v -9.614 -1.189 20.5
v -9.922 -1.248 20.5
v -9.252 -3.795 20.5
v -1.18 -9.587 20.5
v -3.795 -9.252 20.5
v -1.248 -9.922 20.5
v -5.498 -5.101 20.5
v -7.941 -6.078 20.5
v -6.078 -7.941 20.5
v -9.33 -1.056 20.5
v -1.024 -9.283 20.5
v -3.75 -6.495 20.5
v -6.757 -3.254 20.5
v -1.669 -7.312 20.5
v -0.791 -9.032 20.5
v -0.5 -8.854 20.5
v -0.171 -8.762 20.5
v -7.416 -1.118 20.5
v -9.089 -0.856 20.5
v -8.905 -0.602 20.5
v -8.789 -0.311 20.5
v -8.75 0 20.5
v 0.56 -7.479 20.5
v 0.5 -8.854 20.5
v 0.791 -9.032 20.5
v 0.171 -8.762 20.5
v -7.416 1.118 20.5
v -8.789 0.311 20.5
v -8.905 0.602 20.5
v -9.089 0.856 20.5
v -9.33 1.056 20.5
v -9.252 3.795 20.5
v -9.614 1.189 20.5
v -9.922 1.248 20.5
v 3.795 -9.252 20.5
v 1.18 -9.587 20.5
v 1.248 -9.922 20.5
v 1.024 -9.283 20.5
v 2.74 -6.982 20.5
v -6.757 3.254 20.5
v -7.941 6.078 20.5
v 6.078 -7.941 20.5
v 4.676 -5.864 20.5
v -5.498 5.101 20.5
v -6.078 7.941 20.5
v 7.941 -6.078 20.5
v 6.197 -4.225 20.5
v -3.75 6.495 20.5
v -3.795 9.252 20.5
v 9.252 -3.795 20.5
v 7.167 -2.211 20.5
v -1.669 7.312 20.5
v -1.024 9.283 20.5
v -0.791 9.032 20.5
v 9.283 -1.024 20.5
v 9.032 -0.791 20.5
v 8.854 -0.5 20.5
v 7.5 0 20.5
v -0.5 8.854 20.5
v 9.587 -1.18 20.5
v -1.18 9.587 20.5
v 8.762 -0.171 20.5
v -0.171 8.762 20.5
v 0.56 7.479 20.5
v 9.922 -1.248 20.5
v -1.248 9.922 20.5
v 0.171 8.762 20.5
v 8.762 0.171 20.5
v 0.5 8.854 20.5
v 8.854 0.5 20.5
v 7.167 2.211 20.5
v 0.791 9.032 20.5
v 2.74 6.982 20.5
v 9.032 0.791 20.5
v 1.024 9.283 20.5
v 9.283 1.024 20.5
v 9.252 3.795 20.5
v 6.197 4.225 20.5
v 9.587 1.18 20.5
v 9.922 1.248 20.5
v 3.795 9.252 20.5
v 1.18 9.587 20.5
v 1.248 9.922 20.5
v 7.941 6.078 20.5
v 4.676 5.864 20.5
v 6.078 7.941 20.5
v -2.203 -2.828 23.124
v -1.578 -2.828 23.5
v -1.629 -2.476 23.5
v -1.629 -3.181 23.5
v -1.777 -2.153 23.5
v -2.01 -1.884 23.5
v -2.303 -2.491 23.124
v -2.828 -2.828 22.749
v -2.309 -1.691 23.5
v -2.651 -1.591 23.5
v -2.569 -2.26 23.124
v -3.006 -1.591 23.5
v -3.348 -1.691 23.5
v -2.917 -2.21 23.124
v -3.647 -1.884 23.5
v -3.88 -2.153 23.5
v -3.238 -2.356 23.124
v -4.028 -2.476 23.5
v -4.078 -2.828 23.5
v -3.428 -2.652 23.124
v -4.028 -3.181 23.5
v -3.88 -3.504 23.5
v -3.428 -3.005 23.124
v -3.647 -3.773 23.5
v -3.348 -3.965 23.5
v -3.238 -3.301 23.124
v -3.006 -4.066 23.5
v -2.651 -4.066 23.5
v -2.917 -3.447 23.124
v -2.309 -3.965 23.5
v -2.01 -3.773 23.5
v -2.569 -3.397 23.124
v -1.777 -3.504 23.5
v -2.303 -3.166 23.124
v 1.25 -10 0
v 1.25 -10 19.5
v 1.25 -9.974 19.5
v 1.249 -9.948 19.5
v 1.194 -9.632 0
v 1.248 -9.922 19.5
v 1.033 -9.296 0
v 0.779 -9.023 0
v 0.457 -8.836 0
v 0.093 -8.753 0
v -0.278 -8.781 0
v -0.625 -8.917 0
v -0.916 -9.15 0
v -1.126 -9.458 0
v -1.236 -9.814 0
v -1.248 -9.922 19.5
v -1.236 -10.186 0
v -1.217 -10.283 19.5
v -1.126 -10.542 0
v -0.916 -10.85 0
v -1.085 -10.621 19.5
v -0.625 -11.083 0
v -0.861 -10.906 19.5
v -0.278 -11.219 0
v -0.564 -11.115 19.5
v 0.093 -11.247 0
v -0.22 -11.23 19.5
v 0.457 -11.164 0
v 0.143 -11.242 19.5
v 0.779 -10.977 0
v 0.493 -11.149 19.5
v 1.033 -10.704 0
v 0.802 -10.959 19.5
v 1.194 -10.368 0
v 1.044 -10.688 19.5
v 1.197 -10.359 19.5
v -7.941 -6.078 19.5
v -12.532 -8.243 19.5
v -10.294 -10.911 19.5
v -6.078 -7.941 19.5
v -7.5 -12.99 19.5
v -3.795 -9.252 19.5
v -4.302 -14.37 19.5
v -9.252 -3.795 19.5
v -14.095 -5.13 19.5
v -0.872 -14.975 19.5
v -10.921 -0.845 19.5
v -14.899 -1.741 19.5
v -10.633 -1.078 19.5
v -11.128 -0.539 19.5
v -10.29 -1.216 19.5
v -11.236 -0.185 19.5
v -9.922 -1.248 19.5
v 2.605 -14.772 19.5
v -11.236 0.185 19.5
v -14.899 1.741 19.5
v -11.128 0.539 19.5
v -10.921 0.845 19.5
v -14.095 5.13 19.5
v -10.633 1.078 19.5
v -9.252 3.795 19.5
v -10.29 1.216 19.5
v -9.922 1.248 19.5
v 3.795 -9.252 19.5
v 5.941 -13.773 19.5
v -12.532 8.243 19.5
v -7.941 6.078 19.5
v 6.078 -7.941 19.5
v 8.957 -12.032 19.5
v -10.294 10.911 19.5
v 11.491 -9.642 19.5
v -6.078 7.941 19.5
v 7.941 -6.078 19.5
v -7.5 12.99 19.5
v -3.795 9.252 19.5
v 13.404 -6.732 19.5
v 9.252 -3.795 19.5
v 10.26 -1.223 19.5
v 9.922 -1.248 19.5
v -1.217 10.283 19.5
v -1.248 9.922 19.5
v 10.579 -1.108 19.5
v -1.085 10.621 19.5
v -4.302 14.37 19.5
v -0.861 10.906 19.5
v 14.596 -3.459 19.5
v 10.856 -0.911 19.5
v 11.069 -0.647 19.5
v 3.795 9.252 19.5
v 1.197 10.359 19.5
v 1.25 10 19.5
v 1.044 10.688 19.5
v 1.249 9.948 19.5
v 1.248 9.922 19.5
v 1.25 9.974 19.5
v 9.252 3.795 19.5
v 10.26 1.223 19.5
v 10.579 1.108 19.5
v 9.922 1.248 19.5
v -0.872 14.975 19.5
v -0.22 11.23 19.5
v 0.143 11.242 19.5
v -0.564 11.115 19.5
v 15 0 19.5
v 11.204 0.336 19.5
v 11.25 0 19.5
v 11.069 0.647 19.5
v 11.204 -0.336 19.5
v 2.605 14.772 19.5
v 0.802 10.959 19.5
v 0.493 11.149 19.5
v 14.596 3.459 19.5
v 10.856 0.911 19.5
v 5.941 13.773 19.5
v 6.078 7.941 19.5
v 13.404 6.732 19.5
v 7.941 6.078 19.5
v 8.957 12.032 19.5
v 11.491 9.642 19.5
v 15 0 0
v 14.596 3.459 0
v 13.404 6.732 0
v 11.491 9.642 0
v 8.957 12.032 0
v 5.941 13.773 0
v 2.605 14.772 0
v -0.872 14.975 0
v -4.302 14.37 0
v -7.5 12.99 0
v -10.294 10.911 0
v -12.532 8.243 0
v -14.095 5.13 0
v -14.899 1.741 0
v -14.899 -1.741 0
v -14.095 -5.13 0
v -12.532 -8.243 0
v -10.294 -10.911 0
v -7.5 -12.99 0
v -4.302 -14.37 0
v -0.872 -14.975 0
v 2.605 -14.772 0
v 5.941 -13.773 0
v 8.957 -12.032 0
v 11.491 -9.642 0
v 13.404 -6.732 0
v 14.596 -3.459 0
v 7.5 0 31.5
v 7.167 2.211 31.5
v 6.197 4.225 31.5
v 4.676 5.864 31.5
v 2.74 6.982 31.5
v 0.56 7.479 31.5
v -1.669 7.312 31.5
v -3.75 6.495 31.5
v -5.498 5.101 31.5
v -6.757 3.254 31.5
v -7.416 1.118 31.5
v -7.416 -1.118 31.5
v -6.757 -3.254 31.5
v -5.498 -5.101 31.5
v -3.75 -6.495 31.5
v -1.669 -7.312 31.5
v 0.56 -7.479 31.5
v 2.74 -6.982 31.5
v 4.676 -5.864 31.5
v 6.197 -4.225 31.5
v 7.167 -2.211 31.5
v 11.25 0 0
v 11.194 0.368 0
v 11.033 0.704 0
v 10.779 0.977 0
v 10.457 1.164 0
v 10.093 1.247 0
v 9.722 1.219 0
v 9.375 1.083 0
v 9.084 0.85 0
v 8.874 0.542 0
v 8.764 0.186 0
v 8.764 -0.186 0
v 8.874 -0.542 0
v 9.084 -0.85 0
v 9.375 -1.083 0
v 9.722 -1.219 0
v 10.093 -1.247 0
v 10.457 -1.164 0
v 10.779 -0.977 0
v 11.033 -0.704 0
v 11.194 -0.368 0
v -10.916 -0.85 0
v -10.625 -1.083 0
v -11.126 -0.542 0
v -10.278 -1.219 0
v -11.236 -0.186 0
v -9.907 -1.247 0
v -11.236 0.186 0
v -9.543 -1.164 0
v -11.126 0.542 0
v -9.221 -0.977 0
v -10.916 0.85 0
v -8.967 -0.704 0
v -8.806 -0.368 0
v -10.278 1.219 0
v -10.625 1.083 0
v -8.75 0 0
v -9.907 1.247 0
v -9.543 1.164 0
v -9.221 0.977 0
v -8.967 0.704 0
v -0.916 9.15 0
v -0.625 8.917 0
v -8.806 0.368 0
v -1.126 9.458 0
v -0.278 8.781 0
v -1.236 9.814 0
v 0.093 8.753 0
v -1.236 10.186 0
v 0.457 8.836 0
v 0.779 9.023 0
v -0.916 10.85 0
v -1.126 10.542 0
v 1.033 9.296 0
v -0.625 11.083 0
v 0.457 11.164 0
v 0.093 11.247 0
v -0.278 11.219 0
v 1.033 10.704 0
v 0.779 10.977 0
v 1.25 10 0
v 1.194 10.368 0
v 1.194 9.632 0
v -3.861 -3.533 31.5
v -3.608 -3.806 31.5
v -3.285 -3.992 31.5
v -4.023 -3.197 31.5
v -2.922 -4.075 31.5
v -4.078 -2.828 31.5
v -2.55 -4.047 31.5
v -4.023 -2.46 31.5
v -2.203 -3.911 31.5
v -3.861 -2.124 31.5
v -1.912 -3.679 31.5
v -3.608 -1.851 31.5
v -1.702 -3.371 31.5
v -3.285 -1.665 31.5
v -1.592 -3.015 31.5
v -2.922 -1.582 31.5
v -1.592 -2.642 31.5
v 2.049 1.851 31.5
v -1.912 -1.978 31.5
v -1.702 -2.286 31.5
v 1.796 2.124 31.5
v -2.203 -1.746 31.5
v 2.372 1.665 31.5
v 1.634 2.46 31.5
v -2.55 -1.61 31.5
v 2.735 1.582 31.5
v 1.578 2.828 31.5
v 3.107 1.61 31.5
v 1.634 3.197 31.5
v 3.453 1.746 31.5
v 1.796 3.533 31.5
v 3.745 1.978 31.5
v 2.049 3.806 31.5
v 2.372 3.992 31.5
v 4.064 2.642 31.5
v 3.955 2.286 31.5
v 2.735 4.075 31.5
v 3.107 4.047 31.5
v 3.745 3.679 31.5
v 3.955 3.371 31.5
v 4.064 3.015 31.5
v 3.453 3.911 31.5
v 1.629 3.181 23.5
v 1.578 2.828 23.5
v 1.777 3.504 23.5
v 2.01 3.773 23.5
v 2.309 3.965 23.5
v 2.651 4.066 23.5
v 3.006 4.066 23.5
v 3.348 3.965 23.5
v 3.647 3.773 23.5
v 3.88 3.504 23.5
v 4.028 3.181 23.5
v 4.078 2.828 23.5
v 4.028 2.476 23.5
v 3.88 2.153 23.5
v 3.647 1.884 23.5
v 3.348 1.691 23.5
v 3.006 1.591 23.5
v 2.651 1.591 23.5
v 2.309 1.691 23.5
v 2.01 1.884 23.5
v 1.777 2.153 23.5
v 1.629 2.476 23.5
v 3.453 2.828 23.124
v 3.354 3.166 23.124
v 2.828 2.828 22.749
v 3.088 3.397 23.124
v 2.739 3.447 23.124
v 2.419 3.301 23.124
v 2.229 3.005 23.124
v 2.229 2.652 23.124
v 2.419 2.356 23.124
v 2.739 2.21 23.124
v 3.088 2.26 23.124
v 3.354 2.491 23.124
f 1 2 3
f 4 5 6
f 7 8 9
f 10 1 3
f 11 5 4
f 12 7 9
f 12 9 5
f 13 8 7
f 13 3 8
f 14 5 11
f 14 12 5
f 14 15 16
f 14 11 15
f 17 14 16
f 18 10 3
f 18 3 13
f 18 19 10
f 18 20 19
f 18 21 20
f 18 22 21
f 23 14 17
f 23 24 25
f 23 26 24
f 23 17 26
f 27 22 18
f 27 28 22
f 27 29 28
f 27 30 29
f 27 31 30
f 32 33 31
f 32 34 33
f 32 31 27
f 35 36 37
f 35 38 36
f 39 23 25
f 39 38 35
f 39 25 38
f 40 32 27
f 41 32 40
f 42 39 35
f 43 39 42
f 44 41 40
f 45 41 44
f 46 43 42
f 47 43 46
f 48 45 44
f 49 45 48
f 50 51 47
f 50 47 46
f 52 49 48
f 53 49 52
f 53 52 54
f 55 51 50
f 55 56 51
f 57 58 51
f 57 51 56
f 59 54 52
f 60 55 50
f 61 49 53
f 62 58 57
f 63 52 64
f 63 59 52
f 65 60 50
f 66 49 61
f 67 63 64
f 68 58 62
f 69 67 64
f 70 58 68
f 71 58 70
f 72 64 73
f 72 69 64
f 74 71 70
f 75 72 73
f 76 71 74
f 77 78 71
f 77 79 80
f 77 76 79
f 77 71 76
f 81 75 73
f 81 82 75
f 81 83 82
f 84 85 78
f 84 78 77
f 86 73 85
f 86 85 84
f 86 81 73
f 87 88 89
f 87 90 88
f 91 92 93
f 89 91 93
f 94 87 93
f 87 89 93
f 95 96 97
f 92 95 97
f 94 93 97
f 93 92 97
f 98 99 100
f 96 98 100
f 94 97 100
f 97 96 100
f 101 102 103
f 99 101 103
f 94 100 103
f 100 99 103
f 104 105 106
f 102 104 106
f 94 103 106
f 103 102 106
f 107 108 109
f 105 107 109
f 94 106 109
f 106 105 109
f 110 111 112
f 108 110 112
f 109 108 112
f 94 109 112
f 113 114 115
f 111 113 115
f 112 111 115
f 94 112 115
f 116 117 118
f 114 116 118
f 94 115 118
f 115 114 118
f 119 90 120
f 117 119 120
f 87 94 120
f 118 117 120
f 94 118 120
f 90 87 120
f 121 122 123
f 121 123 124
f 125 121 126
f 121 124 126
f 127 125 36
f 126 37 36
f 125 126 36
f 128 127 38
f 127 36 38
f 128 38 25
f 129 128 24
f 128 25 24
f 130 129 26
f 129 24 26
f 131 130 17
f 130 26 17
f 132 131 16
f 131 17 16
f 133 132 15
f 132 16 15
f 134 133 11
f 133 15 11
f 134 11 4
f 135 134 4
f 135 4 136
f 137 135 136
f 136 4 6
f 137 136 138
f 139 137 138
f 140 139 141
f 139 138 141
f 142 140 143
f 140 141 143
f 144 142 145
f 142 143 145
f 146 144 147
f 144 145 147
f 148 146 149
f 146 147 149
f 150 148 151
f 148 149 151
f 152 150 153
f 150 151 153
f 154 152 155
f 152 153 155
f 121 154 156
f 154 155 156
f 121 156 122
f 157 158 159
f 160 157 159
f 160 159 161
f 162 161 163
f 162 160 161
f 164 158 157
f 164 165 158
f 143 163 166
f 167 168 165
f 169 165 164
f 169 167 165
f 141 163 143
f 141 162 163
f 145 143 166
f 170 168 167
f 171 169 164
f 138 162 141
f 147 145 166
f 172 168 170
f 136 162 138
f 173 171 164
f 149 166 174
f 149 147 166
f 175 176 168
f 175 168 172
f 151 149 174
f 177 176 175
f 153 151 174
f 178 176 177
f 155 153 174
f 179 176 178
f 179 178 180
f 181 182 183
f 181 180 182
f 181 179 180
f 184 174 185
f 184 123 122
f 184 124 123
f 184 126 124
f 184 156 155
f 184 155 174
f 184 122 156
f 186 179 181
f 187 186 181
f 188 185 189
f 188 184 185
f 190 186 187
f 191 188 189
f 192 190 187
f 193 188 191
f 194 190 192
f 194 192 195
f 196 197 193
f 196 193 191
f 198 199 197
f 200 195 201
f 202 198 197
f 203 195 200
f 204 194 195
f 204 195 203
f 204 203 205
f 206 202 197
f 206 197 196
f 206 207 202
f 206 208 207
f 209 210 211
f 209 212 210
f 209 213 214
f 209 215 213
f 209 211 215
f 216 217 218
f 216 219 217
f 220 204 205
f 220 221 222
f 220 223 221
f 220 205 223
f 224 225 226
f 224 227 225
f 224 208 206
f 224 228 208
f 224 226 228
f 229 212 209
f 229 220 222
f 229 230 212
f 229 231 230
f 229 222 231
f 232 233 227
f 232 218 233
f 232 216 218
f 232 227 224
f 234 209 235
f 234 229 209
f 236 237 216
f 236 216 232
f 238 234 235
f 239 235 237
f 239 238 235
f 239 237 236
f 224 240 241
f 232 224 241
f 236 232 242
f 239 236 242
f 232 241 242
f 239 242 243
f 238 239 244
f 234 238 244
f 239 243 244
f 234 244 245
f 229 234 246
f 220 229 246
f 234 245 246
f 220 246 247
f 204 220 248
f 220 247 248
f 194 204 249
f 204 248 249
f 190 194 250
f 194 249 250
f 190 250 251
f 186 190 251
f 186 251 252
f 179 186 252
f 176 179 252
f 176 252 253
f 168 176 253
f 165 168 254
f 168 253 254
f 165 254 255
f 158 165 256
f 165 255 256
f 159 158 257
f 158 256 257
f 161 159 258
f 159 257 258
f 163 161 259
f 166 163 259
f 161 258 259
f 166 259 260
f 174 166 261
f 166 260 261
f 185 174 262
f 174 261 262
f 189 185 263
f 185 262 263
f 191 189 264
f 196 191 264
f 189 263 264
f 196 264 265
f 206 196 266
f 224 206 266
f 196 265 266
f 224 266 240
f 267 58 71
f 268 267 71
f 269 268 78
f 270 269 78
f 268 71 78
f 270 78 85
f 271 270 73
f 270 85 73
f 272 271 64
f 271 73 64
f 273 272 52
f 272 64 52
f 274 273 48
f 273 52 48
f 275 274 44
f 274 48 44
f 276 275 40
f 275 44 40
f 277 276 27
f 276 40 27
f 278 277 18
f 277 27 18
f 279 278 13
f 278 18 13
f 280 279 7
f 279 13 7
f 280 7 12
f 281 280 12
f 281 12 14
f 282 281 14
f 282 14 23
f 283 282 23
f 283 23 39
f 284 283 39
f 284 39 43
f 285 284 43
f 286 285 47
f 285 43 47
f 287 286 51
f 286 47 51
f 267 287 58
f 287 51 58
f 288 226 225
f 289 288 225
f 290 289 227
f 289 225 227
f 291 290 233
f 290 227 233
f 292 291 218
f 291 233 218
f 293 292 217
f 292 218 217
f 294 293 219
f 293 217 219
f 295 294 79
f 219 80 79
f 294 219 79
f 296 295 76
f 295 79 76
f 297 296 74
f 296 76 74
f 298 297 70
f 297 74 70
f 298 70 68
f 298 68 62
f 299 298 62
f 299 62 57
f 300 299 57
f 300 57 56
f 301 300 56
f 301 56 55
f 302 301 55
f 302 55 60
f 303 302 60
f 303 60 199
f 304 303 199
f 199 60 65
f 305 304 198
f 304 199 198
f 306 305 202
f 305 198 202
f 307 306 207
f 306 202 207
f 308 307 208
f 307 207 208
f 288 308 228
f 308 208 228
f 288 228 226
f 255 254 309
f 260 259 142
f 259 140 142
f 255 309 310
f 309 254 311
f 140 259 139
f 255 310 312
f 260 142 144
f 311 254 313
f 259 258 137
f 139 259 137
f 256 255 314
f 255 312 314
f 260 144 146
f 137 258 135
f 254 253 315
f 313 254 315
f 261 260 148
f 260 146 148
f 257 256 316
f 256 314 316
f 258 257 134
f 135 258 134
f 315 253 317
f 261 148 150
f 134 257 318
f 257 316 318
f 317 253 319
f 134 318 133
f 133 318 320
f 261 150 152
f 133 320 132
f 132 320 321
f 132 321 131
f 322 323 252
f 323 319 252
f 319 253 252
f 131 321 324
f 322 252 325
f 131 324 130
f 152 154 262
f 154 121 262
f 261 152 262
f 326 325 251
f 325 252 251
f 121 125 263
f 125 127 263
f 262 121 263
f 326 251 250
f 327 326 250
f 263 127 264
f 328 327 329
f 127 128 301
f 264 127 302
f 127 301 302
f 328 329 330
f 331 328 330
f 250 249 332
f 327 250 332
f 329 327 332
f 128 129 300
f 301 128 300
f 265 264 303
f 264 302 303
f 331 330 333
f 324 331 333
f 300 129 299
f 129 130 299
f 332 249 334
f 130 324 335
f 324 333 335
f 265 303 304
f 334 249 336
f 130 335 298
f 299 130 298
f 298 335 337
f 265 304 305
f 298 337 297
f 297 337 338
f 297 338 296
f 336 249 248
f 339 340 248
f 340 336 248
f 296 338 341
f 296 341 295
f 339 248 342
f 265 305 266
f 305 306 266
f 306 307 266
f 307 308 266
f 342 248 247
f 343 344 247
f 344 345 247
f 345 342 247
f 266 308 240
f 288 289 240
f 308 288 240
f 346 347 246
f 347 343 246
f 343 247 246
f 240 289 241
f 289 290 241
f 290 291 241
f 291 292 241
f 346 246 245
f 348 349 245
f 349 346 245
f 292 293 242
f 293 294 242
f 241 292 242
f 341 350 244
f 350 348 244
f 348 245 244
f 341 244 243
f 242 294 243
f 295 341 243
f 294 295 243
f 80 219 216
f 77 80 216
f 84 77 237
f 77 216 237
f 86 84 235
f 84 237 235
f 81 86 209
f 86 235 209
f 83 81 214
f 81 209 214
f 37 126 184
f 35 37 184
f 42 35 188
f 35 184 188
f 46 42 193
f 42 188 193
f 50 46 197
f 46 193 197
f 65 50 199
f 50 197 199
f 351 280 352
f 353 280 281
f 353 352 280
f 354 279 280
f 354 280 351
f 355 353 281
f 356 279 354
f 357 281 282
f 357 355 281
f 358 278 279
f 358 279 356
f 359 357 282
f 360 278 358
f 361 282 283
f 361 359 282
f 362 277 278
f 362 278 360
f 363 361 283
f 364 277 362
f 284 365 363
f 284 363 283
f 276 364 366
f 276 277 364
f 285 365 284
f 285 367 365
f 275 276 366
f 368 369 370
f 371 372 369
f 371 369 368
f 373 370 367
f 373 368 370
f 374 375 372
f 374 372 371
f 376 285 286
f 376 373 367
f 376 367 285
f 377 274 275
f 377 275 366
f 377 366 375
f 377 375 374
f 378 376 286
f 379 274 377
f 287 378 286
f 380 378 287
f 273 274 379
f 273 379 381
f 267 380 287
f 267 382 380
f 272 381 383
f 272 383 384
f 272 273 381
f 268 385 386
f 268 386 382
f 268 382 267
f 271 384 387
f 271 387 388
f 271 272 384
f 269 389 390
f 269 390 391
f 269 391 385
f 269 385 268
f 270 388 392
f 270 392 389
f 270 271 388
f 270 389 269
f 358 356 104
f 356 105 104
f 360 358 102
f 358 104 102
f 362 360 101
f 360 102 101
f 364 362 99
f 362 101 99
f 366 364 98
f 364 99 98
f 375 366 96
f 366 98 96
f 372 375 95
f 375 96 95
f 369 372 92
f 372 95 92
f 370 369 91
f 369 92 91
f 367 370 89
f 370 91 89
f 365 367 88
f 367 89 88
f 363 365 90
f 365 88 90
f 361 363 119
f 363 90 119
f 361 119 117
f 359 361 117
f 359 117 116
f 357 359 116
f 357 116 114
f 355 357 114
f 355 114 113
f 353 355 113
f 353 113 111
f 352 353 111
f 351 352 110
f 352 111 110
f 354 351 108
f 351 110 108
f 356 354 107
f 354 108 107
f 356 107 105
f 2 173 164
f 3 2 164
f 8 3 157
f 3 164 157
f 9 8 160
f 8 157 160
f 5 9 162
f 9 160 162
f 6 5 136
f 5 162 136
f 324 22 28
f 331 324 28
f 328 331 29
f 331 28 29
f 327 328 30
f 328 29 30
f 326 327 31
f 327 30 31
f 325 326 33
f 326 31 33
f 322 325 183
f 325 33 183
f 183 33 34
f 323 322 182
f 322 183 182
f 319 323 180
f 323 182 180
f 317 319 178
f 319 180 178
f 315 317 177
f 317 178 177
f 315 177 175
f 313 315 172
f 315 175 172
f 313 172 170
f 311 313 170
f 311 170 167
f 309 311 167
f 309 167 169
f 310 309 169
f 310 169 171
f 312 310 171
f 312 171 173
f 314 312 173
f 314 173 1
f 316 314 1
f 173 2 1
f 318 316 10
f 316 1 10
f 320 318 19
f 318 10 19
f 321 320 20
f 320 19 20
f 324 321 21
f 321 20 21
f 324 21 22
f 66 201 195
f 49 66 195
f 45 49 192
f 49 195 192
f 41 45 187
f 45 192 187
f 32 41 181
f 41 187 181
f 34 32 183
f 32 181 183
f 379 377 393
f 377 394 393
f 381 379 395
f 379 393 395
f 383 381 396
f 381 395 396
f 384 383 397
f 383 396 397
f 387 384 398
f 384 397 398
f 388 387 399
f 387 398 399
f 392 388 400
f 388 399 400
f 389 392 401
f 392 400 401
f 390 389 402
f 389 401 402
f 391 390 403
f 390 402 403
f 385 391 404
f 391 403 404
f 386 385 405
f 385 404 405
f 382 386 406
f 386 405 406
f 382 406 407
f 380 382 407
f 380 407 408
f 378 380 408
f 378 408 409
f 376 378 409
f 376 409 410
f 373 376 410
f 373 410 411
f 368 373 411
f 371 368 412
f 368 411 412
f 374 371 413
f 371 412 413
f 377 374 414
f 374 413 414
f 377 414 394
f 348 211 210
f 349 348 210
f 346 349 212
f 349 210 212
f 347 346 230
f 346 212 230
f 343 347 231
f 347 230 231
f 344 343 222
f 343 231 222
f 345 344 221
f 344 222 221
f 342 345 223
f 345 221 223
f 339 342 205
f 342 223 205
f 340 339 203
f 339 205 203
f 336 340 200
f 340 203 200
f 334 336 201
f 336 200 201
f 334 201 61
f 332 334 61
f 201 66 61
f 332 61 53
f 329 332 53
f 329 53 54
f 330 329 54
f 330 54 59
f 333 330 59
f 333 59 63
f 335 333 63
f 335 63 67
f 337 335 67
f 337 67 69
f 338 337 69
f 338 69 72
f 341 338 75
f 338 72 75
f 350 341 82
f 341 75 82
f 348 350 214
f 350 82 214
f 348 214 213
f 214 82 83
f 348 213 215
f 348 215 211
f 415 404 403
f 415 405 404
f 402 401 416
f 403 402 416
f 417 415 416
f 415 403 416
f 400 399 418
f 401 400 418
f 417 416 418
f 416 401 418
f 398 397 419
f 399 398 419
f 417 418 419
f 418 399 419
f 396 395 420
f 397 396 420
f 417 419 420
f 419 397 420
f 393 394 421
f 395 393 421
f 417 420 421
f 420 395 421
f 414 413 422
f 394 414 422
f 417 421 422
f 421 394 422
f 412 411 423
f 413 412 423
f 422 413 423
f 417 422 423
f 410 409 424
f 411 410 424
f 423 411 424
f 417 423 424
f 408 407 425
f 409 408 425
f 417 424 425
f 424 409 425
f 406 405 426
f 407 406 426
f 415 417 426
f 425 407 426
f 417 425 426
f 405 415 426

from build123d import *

# Parameters (mm, degrees)
SKETCH_1_R      = 15
EXTRUDE_1_DEPTH = 19.5
SKETCH_2_R      = 10
EXTRUDE_2_DEPTH = 1
SKETCH_3_R      = 7.5
EXTRUDE_3_DEPTH = 11
M3X0_52_D       = 2.5
M3X0_51_D       = 2.5
M3X0_51_DEPTH   = 8
M3X0_51_TIP     = 0.751075774


with BuildPart() as part:
    # Эскиз1 → Бобышка-Вытянуть1 (new body)
    with BuildSketch(Plane.XY):
        Circle(SKETCH_1_R)
    extrude(amount=EXTRUDE_1_DEPTH)

    # Эскиз2 → Бобышка-Вытянуть2 (add)
    with BuildSketch(Plane.XY.offset(19.5)):
        Circle(SKETCH_2_R)
    extrude(amount=EXTRUDE_2_DEPTH)

    # Эскиз3 → Бобышка-Вытянуть3 (add)
    with BuildSketch(Plane.XY.offset(20.5)):
        Circle(SKETCH_3_R)
    extrude(amount=EXTRUDE_3_DEPTH)

    # Отверстие обработанное метчиком M3x0.52 (through all)
    with Locations(Plane(origin=(0, 0, 0), x_dir=(-1, 0, 0), z_dir=(0, 0, -1))):
        with Locations((0, 10), (10, 0), (-10, 0), (0, -10)):
            Hole(M3X0_52_D / 2)

    # Отверстие обработанное метчиком M3x0.51
    with Locations(Plane.XY.offset(31.5)):
        with Locations((-2.828427125, -2.828427125), (2.828427125, 2.828427125)):
            Hole(M3X0_51_D / 2, depth=M3X0_51_DEPTH)
            with Locations((0, 0, -(M3X0_51_DEPTH + M3X0_51_TIP / 2))):  # 118° drill point
                Cone(0, M3X0_51_D / 2, M3X0_51_TIP, mode=Mode.SUBTRACT)


solid = part.part
